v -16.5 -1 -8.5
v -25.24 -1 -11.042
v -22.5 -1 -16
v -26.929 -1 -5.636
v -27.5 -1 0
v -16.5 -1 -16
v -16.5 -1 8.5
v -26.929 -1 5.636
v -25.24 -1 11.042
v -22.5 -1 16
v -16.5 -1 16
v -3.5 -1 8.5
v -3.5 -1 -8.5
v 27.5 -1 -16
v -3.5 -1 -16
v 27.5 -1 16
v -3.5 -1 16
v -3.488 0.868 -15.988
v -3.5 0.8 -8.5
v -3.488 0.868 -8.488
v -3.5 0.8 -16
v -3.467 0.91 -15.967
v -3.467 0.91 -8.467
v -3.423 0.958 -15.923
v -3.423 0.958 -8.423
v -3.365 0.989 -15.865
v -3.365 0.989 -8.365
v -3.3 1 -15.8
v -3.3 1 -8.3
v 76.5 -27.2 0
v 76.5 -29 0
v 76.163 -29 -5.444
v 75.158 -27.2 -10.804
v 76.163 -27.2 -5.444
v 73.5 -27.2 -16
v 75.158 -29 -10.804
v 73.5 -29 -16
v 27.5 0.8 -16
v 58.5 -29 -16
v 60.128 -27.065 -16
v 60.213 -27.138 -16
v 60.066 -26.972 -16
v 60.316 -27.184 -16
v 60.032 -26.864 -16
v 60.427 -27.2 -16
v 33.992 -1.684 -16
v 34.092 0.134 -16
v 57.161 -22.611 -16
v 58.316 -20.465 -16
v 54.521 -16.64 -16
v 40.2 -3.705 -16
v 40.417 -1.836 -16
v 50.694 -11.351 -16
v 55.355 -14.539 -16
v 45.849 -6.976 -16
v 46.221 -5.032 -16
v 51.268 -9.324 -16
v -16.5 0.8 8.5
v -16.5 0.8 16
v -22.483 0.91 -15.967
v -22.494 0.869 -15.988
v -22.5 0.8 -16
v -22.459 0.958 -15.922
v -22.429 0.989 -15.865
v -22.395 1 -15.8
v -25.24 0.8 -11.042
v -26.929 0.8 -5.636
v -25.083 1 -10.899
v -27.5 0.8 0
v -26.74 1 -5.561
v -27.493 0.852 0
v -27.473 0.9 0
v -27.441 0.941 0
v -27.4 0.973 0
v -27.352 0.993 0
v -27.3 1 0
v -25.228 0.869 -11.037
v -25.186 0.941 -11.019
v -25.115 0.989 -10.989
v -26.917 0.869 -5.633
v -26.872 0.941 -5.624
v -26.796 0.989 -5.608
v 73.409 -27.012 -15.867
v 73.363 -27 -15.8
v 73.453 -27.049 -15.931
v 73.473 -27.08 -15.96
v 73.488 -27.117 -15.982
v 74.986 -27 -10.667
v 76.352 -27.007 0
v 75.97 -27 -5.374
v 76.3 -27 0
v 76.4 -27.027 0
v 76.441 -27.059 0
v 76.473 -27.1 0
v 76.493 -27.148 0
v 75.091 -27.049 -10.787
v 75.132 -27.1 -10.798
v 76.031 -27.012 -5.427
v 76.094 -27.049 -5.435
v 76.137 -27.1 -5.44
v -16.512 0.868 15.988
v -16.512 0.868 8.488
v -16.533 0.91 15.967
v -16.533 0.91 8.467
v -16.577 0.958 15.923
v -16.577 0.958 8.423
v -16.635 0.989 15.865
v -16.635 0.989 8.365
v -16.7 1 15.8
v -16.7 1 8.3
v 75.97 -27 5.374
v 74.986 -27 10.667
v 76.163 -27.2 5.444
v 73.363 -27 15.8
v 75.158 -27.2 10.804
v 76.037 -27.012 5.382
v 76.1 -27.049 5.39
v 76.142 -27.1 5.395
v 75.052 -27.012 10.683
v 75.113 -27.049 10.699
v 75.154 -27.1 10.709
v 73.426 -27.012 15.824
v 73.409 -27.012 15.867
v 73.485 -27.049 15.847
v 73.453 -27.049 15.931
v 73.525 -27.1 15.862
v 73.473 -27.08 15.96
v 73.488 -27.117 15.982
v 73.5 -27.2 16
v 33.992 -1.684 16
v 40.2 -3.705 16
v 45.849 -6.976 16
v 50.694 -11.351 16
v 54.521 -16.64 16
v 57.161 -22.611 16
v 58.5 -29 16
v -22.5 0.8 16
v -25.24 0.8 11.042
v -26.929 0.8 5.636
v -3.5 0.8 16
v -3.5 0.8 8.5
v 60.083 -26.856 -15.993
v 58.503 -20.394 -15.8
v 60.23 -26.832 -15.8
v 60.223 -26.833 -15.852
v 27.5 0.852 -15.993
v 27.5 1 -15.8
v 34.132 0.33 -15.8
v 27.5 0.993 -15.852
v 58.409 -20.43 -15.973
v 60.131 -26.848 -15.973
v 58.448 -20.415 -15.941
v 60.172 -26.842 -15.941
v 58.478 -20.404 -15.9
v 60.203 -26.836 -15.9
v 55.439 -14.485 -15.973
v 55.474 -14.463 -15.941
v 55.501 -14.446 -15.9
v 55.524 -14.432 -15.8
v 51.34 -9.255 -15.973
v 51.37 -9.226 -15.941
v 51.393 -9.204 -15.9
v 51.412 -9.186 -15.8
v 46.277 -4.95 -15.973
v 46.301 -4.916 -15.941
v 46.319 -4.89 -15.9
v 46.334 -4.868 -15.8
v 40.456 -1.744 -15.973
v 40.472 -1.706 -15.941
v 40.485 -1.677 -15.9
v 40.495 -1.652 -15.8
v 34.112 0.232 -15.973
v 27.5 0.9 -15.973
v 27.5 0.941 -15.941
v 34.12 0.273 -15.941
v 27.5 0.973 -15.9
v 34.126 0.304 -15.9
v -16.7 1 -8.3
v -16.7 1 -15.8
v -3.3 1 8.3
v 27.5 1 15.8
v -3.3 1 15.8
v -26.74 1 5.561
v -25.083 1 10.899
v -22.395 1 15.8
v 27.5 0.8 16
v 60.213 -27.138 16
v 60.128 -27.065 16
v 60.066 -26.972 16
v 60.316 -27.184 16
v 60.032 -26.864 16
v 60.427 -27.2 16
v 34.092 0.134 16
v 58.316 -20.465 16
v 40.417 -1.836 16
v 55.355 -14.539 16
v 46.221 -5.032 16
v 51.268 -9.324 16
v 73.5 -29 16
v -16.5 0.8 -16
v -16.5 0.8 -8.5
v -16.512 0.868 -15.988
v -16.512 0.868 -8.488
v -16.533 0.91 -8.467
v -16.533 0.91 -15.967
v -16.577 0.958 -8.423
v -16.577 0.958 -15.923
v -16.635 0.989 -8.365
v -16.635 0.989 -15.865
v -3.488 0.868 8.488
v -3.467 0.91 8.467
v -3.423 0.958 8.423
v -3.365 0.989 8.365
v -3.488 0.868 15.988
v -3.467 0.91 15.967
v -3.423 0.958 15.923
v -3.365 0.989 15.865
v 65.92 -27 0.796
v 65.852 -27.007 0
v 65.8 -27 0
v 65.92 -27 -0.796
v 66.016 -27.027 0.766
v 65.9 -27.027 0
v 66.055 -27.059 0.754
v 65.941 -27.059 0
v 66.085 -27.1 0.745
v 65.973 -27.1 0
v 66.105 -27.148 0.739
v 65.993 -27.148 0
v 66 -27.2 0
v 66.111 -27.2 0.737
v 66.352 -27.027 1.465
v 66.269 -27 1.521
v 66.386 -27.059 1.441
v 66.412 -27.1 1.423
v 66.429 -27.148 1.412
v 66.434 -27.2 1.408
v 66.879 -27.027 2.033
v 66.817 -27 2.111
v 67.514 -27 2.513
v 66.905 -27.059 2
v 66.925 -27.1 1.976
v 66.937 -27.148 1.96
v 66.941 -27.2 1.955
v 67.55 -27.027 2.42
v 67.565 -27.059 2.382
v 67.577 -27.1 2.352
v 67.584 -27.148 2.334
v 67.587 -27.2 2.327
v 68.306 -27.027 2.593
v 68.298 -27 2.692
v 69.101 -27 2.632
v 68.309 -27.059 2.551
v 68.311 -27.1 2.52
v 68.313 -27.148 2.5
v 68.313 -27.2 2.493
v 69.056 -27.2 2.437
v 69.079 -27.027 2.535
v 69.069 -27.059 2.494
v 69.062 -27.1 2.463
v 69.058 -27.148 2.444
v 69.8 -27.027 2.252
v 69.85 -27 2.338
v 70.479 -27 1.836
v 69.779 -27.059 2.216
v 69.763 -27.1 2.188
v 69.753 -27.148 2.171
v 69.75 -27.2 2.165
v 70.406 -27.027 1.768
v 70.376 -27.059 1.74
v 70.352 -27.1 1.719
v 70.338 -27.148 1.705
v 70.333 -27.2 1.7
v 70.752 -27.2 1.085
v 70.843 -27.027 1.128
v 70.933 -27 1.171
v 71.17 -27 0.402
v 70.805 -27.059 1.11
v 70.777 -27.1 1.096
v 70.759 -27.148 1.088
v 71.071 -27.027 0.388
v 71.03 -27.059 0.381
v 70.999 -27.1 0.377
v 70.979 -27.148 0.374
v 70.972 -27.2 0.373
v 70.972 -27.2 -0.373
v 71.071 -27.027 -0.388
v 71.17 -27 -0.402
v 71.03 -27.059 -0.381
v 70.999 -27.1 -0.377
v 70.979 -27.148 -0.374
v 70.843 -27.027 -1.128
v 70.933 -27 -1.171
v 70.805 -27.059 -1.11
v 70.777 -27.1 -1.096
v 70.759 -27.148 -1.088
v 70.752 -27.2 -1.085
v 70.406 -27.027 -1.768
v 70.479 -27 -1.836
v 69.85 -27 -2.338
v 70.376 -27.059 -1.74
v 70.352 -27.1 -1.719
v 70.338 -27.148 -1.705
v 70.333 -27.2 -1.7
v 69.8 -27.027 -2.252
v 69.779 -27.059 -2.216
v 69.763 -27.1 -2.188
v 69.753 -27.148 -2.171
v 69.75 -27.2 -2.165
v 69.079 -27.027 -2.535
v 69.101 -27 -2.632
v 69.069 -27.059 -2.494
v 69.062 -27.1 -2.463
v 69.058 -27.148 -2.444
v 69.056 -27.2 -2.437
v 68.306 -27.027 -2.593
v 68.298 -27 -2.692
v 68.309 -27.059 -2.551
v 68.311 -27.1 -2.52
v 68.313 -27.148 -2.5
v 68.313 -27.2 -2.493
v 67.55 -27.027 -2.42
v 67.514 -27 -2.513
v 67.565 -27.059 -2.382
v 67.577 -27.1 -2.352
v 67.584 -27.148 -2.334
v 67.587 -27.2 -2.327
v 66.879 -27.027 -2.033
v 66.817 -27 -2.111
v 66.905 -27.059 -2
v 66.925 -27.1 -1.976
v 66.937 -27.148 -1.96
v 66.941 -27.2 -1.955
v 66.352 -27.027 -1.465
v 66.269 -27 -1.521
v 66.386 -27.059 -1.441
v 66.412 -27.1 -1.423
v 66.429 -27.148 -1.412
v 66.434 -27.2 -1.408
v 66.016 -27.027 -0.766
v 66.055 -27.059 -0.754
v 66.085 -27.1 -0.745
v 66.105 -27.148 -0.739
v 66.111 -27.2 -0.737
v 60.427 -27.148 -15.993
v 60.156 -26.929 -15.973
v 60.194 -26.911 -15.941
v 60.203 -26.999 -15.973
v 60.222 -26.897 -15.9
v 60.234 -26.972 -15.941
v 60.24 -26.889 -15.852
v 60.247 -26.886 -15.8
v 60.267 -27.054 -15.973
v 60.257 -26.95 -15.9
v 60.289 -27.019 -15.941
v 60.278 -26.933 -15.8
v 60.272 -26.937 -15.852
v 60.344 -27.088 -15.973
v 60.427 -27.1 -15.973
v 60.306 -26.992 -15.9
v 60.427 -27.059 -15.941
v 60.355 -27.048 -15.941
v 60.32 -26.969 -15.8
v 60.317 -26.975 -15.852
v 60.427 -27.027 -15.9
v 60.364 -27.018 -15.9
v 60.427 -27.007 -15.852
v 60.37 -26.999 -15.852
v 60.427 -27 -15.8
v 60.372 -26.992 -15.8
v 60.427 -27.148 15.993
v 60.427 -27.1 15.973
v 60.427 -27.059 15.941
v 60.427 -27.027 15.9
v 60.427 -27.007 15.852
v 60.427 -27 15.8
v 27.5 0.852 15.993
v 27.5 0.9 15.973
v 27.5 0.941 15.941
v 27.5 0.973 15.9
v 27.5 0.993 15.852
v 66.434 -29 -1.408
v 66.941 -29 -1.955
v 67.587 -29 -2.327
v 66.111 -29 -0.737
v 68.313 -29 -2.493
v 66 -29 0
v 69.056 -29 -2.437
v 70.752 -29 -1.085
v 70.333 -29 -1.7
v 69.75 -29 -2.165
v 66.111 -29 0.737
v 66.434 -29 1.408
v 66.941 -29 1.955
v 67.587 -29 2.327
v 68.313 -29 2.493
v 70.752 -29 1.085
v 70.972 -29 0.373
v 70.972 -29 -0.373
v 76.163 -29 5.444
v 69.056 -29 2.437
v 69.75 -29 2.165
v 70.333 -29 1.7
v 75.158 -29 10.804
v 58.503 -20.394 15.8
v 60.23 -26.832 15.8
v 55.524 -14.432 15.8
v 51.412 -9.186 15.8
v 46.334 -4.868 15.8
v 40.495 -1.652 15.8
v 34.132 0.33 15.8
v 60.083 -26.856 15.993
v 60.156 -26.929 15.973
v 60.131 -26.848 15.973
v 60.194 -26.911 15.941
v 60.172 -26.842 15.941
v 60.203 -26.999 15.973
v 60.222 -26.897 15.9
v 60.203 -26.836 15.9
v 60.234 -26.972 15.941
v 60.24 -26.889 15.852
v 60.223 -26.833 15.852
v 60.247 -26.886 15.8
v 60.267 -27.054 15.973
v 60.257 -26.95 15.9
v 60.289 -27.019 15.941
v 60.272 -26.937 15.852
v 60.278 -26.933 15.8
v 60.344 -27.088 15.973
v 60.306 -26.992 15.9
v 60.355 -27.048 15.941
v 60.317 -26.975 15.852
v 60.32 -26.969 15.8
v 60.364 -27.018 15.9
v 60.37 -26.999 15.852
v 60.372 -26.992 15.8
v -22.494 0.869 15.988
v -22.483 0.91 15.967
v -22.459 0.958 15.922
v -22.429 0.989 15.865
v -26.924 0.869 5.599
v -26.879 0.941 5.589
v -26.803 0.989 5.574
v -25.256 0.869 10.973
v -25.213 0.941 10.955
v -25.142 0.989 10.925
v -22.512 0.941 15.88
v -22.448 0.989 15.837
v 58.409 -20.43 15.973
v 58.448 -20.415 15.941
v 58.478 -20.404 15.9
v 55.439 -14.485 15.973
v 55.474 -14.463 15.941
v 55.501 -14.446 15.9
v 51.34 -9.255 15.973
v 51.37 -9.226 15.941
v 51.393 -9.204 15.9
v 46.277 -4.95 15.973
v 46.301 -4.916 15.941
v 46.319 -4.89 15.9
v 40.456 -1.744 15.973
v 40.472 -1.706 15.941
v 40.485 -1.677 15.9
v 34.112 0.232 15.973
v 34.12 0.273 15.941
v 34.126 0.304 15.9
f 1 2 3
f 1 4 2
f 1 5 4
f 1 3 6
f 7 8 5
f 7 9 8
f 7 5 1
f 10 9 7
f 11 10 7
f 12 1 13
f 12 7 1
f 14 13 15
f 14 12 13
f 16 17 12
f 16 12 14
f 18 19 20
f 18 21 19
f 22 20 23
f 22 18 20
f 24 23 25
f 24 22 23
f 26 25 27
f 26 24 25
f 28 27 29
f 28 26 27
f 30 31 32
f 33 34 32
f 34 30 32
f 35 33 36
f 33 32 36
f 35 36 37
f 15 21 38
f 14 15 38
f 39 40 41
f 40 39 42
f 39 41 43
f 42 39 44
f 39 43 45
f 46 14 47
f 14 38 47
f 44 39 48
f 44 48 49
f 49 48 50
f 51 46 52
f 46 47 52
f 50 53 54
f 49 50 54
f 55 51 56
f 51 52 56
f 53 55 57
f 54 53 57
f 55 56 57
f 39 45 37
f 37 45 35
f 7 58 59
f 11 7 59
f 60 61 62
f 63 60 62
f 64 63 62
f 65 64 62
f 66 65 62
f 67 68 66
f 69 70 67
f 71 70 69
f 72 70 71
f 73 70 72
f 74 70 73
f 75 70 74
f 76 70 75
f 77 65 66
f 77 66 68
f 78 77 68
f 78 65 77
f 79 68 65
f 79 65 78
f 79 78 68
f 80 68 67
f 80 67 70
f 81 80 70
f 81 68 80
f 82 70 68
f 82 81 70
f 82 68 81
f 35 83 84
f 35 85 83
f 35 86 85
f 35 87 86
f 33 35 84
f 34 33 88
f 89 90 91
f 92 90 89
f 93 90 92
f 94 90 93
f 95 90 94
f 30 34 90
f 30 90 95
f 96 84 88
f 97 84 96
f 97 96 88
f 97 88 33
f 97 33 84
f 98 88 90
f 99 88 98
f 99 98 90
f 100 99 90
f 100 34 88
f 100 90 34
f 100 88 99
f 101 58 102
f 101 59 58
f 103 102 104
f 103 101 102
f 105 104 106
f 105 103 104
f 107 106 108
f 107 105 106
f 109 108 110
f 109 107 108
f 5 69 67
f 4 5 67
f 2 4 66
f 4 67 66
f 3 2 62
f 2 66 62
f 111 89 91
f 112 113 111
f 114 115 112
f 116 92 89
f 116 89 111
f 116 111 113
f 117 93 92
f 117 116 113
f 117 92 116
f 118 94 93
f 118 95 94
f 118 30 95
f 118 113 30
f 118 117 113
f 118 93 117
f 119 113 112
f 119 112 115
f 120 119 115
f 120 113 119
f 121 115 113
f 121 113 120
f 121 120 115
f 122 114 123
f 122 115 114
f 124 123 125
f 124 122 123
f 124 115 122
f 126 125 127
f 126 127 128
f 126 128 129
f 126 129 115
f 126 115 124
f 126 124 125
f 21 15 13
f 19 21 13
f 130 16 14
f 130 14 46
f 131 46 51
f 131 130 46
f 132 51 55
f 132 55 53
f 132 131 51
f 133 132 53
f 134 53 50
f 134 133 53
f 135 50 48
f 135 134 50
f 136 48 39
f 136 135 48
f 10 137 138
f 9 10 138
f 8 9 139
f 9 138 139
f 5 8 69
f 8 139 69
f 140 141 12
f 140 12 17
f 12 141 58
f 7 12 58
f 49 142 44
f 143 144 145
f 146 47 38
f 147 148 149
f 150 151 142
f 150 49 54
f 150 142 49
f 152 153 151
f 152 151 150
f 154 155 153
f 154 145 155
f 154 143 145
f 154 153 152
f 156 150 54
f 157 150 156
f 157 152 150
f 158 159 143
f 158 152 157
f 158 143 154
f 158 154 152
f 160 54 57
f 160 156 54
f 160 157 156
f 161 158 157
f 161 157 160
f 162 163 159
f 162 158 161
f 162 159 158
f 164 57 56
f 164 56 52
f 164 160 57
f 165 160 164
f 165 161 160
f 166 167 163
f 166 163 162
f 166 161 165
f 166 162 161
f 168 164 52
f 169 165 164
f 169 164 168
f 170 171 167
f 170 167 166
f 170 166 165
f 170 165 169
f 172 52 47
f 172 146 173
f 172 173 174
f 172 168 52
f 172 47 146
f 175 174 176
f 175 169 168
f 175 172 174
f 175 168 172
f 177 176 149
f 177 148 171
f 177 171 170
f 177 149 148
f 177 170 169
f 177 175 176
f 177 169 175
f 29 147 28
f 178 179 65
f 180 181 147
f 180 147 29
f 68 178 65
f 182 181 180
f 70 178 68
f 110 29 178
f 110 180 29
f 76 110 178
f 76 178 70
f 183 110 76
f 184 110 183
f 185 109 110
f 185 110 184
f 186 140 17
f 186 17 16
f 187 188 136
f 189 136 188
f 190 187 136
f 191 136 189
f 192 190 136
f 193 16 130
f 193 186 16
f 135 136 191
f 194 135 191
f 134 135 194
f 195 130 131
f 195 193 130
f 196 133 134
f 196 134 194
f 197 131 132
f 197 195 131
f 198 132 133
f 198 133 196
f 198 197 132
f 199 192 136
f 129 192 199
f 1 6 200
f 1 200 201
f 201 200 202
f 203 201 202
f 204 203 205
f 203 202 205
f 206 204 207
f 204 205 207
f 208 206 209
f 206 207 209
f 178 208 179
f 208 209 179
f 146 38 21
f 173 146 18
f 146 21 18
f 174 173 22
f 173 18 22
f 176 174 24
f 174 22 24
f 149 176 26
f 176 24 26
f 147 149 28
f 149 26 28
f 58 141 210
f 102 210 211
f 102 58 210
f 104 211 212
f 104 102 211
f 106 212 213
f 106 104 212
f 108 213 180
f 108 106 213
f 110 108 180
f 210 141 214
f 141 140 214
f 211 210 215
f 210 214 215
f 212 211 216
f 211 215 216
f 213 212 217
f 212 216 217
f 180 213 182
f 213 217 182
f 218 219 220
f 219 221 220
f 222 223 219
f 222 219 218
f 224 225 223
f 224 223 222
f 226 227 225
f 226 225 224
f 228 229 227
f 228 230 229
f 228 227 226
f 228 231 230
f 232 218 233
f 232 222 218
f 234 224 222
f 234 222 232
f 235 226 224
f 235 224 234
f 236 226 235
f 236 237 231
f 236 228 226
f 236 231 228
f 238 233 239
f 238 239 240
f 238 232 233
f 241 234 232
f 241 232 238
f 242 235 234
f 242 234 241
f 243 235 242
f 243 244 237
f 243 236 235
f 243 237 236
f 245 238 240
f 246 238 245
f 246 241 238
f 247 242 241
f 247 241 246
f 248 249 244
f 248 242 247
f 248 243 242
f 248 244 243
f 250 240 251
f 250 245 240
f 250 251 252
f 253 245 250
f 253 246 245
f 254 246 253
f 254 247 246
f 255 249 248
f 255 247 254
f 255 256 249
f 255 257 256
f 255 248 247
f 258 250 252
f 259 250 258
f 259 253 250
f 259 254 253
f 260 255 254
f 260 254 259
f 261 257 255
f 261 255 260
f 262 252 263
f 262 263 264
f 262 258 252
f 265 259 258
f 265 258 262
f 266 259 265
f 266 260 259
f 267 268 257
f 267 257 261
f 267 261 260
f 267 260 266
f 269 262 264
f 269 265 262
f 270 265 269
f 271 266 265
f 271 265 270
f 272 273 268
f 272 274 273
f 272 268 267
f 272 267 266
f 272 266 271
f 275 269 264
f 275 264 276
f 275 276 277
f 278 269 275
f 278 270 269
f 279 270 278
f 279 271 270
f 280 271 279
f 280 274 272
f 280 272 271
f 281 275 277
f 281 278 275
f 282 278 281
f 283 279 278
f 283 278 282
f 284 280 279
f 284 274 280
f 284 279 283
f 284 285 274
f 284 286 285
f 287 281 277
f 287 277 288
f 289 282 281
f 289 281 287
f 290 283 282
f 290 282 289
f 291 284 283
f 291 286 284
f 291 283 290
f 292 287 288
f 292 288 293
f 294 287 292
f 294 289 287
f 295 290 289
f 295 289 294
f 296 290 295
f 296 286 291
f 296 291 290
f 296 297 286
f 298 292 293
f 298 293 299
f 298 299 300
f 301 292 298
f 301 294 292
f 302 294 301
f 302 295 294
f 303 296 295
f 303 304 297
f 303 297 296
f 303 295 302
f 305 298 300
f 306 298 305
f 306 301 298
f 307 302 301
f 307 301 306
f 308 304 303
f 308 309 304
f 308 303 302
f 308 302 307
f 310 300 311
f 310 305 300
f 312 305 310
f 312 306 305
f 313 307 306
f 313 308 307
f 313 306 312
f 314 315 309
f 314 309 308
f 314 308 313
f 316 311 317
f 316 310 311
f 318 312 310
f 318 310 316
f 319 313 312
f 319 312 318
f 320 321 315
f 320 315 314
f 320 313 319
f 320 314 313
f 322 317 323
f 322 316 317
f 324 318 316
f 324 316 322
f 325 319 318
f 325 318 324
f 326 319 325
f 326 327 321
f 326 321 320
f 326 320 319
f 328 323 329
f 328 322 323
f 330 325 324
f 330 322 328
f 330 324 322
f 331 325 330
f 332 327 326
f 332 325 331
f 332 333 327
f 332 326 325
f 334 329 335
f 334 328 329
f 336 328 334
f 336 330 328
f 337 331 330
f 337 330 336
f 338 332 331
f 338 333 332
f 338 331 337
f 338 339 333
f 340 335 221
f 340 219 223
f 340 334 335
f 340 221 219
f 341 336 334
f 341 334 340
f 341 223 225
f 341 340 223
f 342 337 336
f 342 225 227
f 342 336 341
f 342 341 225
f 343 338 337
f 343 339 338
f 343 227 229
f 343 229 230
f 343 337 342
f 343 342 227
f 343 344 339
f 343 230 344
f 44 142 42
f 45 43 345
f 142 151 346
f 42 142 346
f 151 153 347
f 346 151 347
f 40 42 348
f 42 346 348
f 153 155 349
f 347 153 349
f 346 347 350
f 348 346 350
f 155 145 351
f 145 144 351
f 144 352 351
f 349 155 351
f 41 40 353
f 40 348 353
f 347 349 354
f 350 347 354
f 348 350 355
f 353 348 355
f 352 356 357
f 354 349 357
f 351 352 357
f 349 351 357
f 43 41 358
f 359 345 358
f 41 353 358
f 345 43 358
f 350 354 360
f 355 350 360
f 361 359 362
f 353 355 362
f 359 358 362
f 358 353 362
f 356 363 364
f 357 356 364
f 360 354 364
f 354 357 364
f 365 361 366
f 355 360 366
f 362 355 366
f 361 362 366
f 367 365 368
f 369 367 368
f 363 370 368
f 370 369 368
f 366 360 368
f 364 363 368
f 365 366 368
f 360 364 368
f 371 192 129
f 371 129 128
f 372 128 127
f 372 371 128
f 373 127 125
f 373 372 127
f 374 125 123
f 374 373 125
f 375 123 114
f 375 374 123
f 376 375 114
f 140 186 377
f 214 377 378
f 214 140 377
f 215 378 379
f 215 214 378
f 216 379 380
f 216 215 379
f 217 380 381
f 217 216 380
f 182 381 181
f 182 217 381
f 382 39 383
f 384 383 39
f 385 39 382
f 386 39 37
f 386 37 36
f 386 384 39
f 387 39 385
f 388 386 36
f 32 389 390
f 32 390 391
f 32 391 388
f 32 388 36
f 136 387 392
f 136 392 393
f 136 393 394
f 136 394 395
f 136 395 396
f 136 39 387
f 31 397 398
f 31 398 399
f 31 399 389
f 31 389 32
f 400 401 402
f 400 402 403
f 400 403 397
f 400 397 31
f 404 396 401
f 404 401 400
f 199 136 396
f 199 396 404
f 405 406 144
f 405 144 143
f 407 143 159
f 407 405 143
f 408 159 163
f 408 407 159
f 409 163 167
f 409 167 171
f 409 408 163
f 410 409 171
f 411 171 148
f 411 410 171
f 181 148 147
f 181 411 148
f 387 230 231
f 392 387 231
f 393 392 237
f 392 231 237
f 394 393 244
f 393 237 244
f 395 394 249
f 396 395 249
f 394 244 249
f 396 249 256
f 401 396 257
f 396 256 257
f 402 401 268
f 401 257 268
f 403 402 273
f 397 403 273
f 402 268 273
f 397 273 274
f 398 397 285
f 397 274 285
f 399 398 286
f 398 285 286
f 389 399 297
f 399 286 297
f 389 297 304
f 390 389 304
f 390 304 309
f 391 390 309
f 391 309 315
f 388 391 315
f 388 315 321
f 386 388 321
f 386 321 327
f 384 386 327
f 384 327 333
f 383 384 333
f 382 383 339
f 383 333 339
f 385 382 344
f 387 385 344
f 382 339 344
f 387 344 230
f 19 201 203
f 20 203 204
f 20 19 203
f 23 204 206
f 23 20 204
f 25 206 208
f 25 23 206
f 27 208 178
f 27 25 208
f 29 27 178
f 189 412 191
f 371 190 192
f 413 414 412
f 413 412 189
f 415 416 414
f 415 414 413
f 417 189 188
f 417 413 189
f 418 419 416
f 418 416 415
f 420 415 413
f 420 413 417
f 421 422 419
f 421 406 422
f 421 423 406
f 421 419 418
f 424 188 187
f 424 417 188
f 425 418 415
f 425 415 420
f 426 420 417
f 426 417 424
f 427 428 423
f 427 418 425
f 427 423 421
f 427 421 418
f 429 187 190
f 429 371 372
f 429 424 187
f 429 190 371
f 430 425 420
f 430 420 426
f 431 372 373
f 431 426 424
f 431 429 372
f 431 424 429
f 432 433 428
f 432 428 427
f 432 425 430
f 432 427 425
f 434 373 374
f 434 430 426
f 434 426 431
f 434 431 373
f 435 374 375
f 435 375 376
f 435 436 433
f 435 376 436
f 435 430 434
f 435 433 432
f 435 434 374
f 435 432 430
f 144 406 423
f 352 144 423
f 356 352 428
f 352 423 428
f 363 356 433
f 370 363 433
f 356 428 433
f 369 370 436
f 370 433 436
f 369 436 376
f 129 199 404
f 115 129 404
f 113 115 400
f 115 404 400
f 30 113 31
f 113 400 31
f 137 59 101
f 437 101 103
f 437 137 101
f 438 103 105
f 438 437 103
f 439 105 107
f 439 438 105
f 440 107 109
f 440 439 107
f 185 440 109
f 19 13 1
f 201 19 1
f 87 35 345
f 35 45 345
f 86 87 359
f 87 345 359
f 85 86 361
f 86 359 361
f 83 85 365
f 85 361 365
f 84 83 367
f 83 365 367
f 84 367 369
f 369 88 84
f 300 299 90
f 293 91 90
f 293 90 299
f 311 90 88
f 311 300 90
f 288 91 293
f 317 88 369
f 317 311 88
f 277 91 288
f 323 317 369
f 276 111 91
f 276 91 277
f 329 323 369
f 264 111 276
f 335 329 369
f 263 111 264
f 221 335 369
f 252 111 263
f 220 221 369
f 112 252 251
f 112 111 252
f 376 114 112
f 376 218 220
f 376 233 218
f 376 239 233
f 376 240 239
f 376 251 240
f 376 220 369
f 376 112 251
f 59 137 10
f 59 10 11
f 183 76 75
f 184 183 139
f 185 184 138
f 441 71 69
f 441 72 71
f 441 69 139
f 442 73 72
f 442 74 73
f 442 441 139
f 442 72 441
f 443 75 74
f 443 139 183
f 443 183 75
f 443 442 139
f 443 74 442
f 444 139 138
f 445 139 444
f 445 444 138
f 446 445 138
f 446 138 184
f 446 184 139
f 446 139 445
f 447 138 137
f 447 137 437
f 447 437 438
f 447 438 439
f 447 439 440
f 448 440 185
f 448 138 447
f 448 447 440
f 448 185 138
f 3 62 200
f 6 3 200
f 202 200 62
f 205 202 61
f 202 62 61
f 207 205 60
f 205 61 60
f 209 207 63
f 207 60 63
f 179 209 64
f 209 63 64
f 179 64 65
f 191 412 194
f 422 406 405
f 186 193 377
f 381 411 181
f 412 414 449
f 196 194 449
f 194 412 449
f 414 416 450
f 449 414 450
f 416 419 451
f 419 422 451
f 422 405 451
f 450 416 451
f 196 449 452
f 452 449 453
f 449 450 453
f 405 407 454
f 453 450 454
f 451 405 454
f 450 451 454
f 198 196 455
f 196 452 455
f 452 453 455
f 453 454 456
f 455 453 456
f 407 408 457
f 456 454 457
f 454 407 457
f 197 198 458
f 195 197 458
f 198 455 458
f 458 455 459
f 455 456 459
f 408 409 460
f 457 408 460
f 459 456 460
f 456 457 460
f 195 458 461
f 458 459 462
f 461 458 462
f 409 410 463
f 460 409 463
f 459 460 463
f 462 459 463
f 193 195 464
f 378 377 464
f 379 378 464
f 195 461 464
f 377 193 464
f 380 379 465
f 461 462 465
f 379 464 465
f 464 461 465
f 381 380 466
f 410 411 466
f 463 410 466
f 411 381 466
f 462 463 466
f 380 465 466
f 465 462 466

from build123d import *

# Parameters (mm, degrees)
F1_DEPTH = 16
F3_DEPTH = 12.5
F5_DEPTH = 12.5
F6_W     = 13
F6_H     = 7.5
F7_DEPTH = 12.5
F8_R     = 2.5
F9_DEPTH = 12.5
F10_R    = 0.2


with BuildPart() as f1:
    # F0 (on Top) → F1 (new body, symmetric)
    with BuildSketch(Plane.XY):
        with BuildLine():
            Line((-27.5, -1), (27.5, -1))
            ThreePointArc((27.5, -1), (48.3865985742, -9.0362658643), (58.5, -29))
            Line((58.5, -29), (76.5, -29))
            Line((76.5, -29), (76.5, -27))
            Line((76.5, -27), (60.2566787083, -27))
            ThreePointArc((60.2566787083, -27), (49.0464614264, -6.9539102055), (27.5, 1))
            Line((27.5, 1), (-27.5, 1))
            Line((-27.5, 1), (-27.5, -1))
        make_face()
    extrude(amount=F1_DEPTH, both=True)

    # F2 (on face) → F3 (cut, symmetric)
    with BuildSketch(Plane.XZ.offset(29)):
        with BuildLine():
            Line((76.5, 0), (76.5, 16))
            Line((76.5, 16), (73.5, 16))
            ThreePointArc((73.5, 16), (75.7435215896, 8.139410298), (76.5, 0))
        make_face()
        with BuildLine():
            Line((76.5, -16), (76.5, 0))
            ThreePointArc((76.5, 0), (75.7435215896, -8.139410298), (73.5, -16))
            Line((73.5, -16), (76.5, -16))
        make_face()
    extrude(amount=F3_DEPTH, both=True, mode=Mode.SUBTRACT)

    # F4 (on face) → F5 (cut, symmetric)
    with BuildSketch(Plane(origin=(0, 1, 0), x_dir=(-1, 0, 0), z_dir=(0, 1, 0))):
        with BuildLine():
            Line((27.5, -16), (27.5, -3.42e-08))
            ThreePointArc((27.5, -3.42e-08), (26.2208873777, -8.3815273234), (22.5, -16))
            Line((22.5, -16), (27.5, -16))
        make_face()
        with BuildLine():
            Line((27.5, -3.42e-08), (27.5, 16))
            Line((27.5, 16), (22.5, 16))
            ThreePointArc((22.5, 16), (26.2208873879, 8.3815272908), (27.5, -3.42e-08))
        make_face()
    extrude(amount=F5_DEPTH, both=True, mode=Mode.SUBTRACT)

    # F6 (on face) → F7 (cut, symmetric)
    with BuildSketch(Plane(origin=(0, 1, 0), x_dir=(-1, 0, 0), z_dir=(0, 1, 0))):
        with Locations((10, -12.25)):
            Rectangle(F6_W, F6_H)
        with Locations((10, 12.25)):
            Rectangle(F6_W, F6_H)
    extrude(amount=F7_DEPTH, both=True, mode=Mode.SUBTRACT)

    # F8 (on face) → F9 (cut, symmetric)
    with BuildSketch(Plane(origin=(0, -27, 0), x_dir=(-1, 0, 0), z_dir=(0, 1, 0))):
        with Locations((-68.5, 0)):
            Circle(F8_R)
    extrude(amount=F9_DEPTH, both=True, mode=Mode.SUBTRACT)

    # F10
    f10_edges = [f1.edges().sort_by_distance(p)[0] for p in [
        (76.5, -27, 0),
        (66.878339, -27, 16),
        (66.878339, -27, -16),
        (60.256679, -27, 0),
        (71, -27, 0),
        (49.046461, -6.95391, -16),
        (27.5, 1, 0),
        (49.046461, -6.95391, 16),
        (12, 1, 16),
        (-3.5, 1, 12.25),
        (-10, 1, 8.5),
        (-16.5, 1, 12.25),
        (-19.5, 1, 16),
        (-27.5, 1, 0),
        (-19.5, 1, -16),
        (-16.5, 1, -12.25),
        (-10, 1, -8.5),
        (-3.5, 1, -12.25),
        (12, 1, -16),
    ]]
    fillet(f10_edges, radius=F10_R)


solid = f1.part
